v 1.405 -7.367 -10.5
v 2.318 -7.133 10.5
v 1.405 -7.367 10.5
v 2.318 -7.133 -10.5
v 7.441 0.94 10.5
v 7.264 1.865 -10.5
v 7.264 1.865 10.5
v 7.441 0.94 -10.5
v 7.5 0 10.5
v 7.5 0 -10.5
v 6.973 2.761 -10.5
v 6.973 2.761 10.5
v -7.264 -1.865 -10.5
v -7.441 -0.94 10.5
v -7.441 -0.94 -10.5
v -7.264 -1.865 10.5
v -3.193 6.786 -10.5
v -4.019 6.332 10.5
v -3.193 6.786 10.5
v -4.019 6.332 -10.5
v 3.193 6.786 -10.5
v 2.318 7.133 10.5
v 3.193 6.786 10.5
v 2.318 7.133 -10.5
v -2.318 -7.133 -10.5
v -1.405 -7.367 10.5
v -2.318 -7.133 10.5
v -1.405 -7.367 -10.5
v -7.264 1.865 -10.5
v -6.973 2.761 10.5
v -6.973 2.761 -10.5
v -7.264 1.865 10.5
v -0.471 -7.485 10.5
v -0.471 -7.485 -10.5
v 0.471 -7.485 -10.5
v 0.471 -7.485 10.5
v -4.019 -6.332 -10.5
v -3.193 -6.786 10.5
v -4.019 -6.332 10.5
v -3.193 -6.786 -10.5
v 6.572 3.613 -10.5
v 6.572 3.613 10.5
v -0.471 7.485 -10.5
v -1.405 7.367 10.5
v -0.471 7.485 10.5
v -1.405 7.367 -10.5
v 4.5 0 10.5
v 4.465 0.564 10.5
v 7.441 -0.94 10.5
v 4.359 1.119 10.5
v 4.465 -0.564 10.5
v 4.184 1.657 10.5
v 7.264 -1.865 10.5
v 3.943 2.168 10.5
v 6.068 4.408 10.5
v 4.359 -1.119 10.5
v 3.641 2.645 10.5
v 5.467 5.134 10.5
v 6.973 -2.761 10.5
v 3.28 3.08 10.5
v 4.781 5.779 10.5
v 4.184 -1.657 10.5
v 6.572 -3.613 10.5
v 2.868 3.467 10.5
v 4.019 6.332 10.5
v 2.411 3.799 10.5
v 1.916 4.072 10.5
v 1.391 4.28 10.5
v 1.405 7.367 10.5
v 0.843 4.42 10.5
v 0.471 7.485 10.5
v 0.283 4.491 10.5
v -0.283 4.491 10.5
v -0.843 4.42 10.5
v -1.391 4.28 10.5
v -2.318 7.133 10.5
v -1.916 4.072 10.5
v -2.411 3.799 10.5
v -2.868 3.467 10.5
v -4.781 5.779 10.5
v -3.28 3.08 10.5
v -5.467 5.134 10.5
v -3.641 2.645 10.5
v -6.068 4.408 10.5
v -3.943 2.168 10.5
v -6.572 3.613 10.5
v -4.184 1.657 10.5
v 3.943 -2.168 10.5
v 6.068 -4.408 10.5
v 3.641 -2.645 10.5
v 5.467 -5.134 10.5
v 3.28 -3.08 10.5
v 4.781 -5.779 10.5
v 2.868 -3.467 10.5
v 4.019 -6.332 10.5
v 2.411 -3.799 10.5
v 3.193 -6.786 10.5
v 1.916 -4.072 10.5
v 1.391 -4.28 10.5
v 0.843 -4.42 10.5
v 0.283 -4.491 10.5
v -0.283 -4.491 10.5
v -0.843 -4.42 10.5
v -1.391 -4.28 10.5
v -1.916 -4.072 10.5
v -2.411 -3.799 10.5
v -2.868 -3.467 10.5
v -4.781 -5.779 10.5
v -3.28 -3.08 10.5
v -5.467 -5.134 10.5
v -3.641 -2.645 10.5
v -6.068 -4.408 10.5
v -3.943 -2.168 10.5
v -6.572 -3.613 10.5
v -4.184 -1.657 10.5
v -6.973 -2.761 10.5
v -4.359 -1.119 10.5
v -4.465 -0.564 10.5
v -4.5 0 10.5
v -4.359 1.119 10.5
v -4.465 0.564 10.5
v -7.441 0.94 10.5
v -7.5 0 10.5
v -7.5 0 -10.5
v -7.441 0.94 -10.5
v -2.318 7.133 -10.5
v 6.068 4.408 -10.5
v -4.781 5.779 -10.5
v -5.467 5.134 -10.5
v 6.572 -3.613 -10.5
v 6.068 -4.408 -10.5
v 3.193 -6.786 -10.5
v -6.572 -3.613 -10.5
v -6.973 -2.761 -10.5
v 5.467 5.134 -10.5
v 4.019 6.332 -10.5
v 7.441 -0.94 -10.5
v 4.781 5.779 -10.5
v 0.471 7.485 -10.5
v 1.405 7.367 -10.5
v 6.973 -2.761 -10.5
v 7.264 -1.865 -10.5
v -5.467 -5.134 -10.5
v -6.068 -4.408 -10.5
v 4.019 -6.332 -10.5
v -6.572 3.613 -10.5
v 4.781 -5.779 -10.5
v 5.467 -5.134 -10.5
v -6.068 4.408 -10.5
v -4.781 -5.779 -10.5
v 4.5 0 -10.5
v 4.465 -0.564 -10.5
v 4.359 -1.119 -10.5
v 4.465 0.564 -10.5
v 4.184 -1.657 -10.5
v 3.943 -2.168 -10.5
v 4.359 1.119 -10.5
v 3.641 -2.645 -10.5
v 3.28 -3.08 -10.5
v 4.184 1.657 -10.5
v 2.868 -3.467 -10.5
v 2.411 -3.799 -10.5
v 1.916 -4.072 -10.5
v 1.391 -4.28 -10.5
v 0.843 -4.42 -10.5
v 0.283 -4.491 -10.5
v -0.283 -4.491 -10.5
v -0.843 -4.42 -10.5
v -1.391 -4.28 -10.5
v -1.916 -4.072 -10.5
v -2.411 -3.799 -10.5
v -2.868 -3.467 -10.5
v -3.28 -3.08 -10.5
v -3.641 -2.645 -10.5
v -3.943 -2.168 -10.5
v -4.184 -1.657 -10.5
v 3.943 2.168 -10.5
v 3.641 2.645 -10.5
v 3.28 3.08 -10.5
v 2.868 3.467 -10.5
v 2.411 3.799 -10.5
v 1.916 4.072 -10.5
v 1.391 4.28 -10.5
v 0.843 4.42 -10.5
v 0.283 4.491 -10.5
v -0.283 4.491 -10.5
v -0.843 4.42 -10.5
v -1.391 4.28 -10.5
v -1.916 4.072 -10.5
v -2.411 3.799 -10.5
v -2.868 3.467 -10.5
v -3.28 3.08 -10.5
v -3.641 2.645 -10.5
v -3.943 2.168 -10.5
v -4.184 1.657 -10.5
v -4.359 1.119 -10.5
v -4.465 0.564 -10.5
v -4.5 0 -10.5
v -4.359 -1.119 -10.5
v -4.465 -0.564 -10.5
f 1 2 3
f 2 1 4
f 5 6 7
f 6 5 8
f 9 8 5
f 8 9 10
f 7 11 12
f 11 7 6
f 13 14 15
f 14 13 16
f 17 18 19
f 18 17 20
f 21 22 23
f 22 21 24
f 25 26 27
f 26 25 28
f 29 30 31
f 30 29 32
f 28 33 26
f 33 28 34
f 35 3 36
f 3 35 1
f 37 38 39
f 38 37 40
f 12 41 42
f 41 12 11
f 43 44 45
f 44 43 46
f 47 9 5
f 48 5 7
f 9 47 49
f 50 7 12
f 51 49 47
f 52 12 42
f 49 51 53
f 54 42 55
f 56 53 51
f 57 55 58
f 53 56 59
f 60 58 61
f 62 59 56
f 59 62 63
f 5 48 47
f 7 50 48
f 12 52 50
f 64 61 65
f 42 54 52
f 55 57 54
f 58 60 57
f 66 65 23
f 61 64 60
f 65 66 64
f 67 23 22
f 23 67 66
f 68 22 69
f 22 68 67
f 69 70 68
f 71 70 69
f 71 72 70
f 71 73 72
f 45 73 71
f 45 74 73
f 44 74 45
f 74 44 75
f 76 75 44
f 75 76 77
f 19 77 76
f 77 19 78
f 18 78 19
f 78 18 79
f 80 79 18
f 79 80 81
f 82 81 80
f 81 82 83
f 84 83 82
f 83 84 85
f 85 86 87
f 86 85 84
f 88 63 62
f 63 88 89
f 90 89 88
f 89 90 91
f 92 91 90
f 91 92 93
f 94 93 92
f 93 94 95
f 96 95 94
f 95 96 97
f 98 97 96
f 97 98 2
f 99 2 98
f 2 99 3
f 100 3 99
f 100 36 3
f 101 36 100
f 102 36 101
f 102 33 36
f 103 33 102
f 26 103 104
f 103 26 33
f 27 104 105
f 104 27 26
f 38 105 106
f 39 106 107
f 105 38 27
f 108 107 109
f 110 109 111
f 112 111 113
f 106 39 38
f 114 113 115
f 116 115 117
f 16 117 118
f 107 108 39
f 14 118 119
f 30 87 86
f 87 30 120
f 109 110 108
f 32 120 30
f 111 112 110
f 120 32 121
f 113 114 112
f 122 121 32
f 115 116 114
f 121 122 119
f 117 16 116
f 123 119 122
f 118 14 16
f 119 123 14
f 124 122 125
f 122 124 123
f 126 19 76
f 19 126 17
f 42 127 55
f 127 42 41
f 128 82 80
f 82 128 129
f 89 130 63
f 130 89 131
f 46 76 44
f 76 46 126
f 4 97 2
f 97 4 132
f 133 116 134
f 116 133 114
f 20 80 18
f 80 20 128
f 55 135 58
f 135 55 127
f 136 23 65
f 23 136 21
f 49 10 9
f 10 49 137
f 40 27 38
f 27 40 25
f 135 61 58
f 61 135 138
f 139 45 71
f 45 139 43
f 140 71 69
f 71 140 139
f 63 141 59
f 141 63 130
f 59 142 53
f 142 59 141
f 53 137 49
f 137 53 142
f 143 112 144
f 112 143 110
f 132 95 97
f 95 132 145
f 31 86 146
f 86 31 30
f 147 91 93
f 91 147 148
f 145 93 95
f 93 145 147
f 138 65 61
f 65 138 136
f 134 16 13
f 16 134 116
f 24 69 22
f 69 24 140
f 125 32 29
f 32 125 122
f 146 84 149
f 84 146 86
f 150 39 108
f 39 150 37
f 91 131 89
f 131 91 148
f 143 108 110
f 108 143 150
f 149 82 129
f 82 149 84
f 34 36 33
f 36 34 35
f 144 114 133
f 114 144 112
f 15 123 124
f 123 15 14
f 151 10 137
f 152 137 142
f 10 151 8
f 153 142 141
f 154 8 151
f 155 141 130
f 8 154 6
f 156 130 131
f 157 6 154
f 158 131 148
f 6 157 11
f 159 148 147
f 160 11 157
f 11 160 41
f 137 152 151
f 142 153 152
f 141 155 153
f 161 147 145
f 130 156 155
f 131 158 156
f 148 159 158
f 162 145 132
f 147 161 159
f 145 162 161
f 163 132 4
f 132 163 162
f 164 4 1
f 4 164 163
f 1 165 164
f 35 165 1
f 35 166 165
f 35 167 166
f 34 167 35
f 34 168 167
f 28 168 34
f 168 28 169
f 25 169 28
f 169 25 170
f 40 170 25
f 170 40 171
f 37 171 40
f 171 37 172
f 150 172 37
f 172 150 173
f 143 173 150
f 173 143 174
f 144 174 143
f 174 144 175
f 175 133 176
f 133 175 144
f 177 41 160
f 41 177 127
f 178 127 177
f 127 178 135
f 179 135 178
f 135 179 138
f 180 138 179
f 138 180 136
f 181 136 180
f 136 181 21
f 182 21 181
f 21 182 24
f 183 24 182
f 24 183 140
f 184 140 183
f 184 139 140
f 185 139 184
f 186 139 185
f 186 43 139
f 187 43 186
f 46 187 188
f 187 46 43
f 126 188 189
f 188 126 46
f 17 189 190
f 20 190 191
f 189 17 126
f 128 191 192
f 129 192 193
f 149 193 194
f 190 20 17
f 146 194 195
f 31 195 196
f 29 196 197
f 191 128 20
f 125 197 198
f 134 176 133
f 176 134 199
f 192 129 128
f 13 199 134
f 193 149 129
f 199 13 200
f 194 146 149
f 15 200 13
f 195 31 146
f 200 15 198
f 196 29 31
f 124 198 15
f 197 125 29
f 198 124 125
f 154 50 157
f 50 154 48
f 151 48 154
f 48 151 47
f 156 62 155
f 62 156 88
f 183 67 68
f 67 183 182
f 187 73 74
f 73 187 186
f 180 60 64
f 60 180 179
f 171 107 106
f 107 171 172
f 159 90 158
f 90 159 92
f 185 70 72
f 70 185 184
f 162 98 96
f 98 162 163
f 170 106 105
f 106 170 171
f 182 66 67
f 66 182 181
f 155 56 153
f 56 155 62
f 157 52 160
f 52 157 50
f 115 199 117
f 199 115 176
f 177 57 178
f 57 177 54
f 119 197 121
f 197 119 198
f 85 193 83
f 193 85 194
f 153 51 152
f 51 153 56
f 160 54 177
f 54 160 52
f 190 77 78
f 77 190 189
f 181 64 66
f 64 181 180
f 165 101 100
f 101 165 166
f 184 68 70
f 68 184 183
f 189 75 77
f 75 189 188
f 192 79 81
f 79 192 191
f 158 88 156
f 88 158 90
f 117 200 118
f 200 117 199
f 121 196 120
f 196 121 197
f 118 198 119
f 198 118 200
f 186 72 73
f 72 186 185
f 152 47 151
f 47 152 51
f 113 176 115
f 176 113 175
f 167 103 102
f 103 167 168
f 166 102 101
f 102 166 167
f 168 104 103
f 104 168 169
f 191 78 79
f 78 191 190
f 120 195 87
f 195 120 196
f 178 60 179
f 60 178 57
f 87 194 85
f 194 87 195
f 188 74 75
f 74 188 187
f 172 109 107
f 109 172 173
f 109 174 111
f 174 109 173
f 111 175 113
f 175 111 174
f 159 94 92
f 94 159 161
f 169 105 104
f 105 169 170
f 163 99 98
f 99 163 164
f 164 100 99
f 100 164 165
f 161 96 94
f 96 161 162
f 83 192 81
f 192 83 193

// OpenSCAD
$fn = 50;


difference() {
	union() {
		translate(v = [0, 0, -10.5000000000]) {
			cylinder(h = 21, r = 7.5000000000);
		}
	}
	union() {
		translate(v = [0, 0, -100.0000000000]) {
			cylinder(h = 200, r = 4.5000000000);
		}
	}
}
